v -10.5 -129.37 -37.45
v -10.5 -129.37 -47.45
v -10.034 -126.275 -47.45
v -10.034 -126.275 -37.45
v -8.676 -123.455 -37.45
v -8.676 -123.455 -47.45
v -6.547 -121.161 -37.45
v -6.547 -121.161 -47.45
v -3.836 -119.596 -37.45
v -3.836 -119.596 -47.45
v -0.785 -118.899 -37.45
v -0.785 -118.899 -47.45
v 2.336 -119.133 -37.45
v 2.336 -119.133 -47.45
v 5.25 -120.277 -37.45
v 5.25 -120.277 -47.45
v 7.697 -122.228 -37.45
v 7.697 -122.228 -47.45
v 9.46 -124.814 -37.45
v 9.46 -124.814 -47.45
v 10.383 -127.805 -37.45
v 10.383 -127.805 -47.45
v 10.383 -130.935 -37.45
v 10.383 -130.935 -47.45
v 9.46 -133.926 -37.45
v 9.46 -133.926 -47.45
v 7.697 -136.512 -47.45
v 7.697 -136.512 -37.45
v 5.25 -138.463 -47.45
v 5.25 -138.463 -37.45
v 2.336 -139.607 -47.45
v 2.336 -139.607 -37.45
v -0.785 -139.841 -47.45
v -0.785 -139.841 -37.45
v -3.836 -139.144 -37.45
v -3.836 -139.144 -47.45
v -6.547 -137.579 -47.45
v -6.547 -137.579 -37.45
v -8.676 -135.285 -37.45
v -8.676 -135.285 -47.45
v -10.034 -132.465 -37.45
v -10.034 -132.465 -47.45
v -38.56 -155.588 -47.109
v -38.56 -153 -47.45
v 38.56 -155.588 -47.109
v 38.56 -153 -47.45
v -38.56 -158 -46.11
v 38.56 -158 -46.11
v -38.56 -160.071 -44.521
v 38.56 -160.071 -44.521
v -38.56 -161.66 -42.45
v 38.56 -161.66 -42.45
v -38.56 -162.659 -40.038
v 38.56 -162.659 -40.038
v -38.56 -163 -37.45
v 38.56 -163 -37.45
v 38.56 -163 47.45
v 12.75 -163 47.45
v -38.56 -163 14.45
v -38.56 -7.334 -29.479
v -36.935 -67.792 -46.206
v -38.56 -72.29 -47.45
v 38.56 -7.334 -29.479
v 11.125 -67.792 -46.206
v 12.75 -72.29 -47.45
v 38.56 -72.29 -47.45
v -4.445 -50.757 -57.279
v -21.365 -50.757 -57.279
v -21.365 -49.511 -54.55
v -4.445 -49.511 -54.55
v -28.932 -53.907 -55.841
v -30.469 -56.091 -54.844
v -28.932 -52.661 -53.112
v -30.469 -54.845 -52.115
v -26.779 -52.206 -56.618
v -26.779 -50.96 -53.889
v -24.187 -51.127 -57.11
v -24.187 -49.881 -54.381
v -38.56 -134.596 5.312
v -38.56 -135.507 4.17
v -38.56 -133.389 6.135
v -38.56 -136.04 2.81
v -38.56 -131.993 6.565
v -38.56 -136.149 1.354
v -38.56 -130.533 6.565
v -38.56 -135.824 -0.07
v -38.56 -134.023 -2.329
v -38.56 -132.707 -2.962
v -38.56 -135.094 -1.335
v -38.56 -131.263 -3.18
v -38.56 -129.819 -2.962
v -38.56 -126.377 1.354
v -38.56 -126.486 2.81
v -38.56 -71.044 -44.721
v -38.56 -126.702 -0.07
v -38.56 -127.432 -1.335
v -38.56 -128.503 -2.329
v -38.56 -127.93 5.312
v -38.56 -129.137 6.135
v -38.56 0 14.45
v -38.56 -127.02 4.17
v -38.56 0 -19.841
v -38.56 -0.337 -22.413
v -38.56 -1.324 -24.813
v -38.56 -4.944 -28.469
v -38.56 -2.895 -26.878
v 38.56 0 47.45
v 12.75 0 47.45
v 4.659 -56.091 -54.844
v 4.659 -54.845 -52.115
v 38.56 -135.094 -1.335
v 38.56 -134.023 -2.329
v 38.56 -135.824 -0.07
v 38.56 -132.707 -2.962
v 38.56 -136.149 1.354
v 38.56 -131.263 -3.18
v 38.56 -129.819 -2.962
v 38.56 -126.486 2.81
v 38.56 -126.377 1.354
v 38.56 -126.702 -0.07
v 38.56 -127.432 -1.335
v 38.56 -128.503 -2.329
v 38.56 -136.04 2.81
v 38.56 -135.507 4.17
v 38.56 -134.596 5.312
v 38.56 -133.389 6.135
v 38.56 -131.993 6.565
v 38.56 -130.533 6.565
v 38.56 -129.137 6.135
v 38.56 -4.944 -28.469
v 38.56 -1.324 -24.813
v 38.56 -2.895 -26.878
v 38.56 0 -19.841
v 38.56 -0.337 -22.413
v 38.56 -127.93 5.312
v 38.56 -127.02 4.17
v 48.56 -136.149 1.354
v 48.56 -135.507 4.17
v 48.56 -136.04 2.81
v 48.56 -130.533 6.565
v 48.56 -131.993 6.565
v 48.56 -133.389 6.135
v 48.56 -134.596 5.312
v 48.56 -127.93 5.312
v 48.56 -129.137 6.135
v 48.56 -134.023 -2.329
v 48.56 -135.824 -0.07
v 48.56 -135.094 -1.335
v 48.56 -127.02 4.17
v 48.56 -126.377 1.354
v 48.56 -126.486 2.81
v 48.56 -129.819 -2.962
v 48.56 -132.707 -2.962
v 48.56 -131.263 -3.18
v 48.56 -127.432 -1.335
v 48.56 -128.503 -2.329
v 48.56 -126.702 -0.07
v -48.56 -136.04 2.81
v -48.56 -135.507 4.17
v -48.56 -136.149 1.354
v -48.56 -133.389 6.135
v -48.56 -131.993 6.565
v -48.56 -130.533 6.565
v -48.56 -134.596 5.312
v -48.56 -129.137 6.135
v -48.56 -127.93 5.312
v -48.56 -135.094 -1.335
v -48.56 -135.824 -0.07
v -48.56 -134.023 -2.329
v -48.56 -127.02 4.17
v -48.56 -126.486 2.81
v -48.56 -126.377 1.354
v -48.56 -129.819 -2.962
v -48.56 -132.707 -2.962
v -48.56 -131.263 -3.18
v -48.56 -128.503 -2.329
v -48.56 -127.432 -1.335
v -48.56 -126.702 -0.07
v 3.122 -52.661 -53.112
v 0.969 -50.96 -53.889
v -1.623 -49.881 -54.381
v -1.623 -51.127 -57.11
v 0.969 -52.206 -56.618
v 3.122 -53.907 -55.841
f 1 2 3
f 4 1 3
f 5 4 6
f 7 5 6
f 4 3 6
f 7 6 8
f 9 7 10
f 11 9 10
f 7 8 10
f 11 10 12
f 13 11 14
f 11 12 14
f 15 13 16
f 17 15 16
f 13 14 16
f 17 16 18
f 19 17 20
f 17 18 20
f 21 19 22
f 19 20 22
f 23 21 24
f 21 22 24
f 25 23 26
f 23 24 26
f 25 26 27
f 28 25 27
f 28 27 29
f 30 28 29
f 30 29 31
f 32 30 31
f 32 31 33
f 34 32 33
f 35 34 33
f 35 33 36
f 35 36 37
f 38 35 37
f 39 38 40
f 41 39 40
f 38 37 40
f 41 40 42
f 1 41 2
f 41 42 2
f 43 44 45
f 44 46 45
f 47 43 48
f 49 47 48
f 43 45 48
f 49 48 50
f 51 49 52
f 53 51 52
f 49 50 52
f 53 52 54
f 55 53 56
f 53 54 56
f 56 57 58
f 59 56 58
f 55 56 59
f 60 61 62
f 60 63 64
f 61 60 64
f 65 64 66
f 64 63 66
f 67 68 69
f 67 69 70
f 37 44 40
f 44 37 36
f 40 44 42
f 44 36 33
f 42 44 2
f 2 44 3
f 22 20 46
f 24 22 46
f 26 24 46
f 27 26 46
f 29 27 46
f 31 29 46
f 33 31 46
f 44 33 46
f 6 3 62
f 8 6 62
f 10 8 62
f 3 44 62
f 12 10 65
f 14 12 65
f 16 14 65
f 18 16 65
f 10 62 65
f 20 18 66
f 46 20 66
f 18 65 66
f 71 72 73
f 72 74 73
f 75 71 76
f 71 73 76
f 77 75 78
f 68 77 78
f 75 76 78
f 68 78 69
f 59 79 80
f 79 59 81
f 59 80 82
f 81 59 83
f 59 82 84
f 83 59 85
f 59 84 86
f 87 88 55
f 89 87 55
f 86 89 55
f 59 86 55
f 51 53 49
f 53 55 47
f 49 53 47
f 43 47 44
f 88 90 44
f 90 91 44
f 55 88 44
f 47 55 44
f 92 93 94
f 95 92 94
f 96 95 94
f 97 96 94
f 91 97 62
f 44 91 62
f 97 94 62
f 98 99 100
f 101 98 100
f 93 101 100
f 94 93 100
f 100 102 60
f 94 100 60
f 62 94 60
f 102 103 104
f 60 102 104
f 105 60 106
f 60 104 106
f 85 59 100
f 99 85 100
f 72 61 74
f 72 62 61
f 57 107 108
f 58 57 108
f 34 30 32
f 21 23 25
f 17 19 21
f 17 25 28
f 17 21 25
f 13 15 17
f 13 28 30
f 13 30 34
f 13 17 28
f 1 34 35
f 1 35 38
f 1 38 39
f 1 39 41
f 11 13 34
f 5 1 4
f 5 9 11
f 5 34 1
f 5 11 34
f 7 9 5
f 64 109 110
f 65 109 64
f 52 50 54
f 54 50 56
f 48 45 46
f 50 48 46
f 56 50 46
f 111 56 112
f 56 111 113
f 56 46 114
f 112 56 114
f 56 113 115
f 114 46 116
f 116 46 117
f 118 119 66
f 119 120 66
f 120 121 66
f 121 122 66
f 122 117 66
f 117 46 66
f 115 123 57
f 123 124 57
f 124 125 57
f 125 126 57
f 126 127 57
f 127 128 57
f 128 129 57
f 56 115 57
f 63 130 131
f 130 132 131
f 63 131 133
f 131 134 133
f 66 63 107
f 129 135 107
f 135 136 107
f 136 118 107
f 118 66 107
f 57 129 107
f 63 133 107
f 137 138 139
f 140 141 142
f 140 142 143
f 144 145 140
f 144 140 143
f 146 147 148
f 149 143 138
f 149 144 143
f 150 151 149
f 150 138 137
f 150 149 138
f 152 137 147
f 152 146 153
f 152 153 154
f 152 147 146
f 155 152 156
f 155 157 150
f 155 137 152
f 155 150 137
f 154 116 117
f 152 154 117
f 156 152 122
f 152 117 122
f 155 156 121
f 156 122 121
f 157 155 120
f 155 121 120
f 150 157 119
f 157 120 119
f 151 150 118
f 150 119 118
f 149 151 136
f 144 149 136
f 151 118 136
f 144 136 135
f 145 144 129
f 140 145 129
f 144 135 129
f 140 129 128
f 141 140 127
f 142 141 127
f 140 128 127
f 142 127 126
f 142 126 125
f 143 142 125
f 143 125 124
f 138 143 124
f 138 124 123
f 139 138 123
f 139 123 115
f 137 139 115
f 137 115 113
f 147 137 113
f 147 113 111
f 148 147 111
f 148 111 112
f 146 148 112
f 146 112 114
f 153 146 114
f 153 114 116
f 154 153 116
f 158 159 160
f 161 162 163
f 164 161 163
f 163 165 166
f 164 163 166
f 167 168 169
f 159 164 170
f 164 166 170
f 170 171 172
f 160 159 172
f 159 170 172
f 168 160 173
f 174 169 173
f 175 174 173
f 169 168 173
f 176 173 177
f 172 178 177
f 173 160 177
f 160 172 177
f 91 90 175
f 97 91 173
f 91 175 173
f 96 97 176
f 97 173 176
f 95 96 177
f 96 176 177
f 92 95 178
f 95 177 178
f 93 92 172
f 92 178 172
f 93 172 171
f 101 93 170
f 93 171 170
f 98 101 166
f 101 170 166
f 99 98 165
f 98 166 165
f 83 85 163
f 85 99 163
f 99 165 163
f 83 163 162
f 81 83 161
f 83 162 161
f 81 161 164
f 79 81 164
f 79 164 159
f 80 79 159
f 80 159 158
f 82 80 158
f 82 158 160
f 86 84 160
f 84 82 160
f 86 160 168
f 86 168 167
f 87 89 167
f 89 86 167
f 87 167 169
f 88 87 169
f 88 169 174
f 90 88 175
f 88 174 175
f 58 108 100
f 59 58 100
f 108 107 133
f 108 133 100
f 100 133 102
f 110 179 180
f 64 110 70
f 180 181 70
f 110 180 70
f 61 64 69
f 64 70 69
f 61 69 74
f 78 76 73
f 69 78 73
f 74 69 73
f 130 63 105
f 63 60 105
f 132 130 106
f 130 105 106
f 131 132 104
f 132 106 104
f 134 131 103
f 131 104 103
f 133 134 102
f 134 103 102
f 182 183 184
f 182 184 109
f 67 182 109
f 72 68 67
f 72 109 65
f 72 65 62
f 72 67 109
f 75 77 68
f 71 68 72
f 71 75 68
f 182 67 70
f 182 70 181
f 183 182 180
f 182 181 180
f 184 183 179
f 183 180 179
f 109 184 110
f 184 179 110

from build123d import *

# Parameters (mm, degrees)
BOSS_EXTRUDE1_DEPTH      = 163
CUT_EXTRUDE2_DEPTH       = 187.46178402
BOSS_EXTRUDE2_DEPTH      = 3
FILLET5_R                = 10
BOSS_EXTRUDE3_DEPTH      = 10
BOSS_EXTRUDE3_DEPTH_BACK = 87.12
SKETCH14_R               = 4.9
SKETCH15_R               = 10.5
CUT_EXTRUDE6_DEPTH       = 10


with BuildPart() as part:
    # Sketch2 → Boss-Extrude1 (new body)
    with BuildSketch(Plane(origin=(0, 0, 0), x_dir=(1, 0, 0), z_dir=(0, 1, 0))):
        Polygon((-38.56, 47.45), (38.56, 47.45), (38.56, -47.45), (12.75, -47.45), (-38.56, -14.45), align=None)
    extrude(amount=-BOSS_EXTRUDE1_DEPTH)

    # Sketch4 → Cut-Extrude2 (cut, through all)
    with BuildSketch(Plane(origin=(38.56, 0, 0), x_dir=(0, 0, -1), z_dir=(1, 0, 0))):
        Polygon((47.45, 0), (27.45, 0), (47.45, -72.29), align=None)
    extrude(amount=-CUT_EXTRUDE2_DEPTH, mode=Mode.SUBTRACT)

    # Sketch13 → Boss-Extrude2 (add)
    with BuildSketch(Plane(origin=(0, -30.389847605, -66.576077827), x_dir=(-1, 0, 0), z_dir=(0, -0.41525187691718835, -0.909706479429905))):
        Polygon((38.56, -46.058979838), (27.805, -22.388979838), (-1.995, -22.388979838), (-12.75, -46.058979838), align=None)
    extrude(amount=-BOSS_EXTRUDE2_DEPTH)

    # Fillet5
    fillet5_edges = [part.edges().sort_by_distance(p)[0] for p in [
        (0, -163, -47.45),
        (0, 0, -27.45),
        (-27.805, -50.134369817, -55.914452207),
        (1.995, -50.134369817, -55.914452207),
    ]]
    fillet(fillet5_edges, radius=FILLET5_R)

    # Sketch14 → Boss-Extrude3 (add, two sides: drawn at the far end of the back side and taken through both)
    with BuildSketch(Plane(origin=(38.56, 0, 0), x_dir=(0, 0, -1), z_dir=(1, 0, 0)).offset(-BOSS_EXTRUDE3_DEPTH_BACK)):
        with Locations((-1.72, -131.263122253)):
            Circle(SKETCH14_R)
    extrude(amount=BOSS_EXTRUDE3_DEPTH + BOSS_EXTRUDE3_DEPTH_BACK)

    # Sketch15 → Cut-Extrude6 (cut)
    with BuildSketch(Plane(origin=(0, 0, -47.45), x_dir=(-1, 0, 0), z_dir=(0, 0, -1))):
        with Locations((0, -129.37)):
            Circle(SKETCH15_R)
    extrude(amount=-CUT_EXTRUDE6_DEPTH, mode=Mode.SUBTRACT)


solid = part.part
